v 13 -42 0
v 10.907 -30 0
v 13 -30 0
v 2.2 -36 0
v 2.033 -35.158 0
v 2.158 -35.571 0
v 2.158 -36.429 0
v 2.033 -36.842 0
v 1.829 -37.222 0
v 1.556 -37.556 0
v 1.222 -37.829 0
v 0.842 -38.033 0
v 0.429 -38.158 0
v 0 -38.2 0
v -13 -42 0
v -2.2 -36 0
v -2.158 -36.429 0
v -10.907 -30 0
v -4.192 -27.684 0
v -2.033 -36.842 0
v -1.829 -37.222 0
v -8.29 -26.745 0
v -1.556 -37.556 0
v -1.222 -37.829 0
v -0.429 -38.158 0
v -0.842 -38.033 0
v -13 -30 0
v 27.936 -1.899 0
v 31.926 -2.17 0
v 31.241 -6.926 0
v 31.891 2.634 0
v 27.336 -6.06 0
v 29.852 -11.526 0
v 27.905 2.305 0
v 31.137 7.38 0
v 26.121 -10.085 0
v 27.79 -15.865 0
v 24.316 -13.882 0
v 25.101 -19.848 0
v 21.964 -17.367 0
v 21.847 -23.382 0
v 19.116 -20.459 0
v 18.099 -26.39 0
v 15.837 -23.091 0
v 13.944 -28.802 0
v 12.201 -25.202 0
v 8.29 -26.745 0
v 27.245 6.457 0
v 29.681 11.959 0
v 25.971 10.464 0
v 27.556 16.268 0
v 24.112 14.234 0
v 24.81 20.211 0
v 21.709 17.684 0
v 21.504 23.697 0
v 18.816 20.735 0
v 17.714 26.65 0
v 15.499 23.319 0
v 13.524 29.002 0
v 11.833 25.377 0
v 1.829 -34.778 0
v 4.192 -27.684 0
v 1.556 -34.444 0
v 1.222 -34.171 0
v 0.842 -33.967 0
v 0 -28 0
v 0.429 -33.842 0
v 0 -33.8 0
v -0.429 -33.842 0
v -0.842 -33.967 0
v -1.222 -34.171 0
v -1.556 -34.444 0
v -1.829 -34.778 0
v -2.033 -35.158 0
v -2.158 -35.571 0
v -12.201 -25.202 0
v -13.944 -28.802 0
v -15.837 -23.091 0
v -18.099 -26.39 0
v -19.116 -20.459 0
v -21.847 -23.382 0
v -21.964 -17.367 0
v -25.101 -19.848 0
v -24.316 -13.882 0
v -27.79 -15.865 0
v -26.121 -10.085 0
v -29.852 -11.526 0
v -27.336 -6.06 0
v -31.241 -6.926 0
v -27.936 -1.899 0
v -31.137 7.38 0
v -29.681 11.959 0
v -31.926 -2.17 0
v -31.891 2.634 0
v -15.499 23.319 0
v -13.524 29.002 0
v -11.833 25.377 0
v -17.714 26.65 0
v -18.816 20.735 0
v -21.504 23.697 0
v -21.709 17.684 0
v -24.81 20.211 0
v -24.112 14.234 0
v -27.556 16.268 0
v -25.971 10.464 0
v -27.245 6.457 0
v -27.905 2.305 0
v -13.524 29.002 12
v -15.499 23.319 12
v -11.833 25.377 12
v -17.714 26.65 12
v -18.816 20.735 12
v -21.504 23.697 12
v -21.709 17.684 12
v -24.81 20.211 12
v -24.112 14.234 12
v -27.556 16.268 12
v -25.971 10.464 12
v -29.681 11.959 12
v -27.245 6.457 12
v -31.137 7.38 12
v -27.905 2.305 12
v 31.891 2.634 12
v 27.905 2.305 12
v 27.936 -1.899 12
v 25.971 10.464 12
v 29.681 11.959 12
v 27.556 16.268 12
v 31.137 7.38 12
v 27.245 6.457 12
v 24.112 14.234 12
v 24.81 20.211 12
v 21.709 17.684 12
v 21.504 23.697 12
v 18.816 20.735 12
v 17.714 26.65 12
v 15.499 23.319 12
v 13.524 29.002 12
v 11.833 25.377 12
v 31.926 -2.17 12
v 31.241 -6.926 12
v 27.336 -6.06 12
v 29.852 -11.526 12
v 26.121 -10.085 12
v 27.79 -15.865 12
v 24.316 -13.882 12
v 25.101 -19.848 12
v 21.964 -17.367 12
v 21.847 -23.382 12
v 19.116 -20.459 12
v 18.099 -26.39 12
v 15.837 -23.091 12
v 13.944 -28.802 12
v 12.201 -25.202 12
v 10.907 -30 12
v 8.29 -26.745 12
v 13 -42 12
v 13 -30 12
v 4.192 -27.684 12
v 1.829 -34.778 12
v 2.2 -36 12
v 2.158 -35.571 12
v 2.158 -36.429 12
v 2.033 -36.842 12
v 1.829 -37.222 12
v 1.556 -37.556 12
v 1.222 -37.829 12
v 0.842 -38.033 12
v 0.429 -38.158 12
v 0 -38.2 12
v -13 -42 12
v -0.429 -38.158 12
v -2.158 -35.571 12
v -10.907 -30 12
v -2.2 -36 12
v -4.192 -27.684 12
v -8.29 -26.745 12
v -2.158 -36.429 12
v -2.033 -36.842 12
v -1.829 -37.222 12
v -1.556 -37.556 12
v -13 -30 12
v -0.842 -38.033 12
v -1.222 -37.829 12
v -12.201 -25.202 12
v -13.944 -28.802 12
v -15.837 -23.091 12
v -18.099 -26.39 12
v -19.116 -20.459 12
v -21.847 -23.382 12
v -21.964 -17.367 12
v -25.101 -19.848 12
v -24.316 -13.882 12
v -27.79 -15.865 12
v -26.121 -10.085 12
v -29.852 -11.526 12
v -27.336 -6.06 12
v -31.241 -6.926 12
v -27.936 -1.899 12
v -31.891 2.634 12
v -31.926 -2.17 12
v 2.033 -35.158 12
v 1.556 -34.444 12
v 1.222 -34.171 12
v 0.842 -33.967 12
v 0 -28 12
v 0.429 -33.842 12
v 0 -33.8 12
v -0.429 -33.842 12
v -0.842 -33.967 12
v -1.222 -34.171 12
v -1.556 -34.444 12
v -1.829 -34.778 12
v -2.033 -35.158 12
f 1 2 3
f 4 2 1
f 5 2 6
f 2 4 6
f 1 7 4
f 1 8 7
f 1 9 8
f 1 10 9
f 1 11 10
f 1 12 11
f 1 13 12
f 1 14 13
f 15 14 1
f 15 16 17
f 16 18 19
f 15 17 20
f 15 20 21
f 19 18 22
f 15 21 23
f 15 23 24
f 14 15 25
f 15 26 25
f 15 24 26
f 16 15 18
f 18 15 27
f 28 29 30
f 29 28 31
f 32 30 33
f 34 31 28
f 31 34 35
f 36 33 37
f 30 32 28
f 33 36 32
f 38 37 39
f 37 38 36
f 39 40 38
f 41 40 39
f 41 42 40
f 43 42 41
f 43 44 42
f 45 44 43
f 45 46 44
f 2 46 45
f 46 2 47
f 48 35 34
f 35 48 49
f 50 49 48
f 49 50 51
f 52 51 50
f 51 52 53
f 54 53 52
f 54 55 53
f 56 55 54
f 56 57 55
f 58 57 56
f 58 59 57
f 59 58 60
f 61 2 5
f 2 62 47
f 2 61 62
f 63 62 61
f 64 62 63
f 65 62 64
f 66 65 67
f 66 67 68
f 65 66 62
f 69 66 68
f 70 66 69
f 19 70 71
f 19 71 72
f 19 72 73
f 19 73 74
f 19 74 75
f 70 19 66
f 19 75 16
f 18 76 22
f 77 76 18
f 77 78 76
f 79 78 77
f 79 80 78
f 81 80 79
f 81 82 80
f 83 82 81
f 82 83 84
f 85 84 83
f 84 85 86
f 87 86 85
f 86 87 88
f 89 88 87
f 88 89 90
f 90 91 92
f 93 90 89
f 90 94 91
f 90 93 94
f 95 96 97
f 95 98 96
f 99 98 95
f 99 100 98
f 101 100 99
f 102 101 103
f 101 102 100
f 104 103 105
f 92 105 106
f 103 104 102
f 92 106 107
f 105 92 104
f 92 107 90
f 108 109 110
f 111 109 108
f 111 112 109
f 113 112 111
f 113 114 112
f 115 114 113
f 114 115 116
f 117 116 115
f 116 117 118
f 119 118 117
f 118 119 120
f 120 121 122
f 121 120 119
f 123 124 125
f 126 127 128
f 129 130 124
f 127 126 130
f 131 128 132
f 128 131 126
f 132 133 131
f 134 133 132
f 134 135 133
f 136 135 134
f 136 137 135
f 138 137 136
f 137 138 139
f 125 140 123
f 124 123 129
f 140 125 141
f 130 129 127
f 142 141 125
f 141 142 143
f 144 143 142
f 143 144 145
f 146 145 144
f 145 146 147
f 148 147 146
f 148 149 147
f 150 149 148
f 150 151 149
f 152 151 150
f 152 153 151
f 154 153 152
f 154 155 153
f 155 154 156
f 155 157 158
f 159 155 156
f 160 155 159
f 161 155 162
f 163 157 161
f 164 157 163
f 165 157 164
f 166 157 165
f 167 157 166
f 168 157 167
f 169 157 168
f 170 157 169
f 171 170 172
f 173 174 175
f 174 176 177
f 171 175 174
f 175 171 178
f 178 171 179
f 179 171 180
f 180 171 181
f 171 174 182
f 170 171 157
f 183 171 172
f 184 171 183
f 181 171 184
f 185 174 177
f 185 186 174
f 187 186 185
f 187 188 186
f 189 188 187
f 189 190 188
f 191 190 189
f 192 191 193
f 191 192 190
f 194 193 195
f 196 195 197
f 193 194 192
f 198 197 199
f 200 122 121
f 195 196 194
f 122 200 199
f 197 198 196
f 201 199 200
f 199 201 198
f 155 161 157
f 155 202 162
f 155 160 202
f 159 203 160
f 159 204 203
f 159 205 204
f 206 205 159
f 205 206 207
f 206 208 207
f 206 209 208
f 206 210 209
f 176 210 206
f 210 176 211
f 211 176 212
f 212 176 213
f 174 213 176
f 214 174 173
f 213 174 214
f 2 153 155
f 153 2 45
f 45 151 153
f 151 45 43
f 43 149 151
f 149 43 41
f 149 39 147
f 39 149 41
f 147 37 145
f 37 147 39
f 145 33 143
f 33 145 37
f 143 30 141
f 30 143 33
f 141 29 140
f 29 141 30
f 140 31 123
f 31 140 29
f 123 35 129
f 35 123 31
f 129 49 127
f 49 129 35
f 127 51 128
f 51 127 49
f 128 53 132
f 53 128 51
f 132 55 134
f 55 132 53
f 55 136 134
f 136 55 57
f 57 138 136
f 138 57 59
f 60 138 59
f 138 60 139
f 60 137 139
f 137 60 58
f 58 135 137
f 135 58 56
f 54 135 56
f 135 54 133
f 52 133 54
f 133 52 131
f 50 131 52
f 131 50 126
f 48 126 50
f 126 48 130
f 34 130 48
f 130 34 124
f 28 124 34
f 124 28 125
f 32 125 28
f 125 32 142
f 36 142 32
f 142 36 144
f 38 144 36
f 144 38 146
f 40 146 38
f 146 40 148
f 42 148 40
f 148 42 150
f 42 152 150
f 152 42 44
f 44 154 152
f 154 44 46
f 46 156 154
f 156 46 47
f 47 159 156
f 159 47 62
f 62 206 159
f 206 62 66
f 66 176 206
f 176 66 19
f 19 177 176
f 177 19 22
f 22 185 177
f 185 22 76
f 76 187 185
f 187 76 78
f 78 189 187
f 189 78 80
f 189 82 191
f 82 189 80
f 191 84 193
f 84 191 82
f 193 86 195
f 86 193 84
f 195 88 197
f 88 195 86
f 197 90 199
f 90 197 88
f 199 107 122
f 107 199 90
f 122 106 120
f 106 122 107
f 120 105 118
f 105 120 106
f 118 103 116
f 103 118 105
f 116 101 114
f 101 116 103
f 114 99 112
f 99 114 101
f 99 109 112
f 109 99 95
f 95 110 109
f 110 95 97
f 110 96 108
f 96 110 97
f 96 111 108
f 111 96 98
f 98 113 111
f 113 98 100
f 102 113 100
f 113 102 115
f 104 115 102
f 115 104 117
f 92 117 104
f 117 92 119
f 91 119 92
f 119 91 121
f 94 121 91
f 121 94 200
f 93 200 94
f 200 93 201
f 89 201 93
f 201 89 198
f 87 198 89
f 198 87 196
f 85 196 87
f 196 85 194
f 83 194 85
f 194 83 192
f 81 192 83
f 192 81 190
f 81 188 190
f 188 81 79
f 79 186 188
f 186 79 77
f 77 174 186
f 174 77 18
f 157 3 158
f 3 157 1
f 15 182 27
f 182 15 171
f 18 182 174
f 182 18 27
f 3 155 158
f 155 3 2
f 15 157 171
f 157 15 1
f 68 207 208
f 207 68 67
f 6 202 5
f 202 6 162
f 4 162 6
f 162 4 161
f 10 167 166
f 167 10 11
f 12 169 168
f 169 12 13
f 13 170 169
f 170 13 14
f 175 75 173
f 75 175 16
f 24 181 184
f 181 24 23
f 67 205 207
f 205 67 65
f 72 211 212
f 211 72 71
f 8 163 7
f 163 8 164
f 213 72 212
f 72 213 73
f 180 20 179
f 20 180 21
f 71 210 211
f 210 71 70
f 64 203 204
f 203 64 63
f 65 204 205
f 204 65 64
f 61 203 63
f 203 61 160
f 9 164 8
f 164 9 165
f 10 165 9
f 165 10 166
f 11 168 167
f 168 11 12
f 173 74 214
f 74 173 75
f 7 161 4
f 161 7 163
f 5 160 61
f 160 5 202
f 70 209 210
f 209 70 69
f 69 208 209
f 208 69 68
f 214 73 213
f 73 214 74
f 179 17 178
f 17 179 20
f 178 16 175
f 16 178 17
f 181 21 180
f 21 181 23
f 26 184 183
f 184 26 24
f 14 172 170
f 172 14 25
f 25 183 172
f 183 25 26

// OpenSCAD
$fn = 32;

// ----------------------------------------------------------------------
// Spring clip: 64 mm outside, 4 mm band, 50 degree opening
// ----------------------------------------------------------------------

// --- parameters (mm) ---
outer_r = 32;             // clip outside radius
inner_r = 28;             // clip bore radius
band = 4;                 // band thickness
clip_w = 12;              // clip width
opening = 50;             // opening angle
tab_w = 26;               // tab width
tab_len = 10;             // tab length past the clip
tab_hole = 4.4;           // tab fixing hole

clip_profile = [[-13.524, 29.002], [-17.714, 26.65], [-21.504, 23.697], [-24.81, 20.211], [-27.556, 16.268], [-29.681, 11.959], [-31.137, 7.38], [-31.891, 2.634], [-31.926, -2.17], [-31.241, -6.926], [-29.852, -11.526], [-27.79, -15.865], [-25.101, -19.848], [-21.847, -23.382], [-18.099, -26.39], [-13.944, -28.802], [-9.475, -30.565], [-4.791, -31.639], [0, -32], [4.791, -31.639], [9.475, -30.565], [13.944, -28.802], [18.099, -26.39], [21.847, -23.382], [25.101, -19.848], [27.79, -15.865], [29.852, -11.526], [31.241, -6.926], [31.926, -2.17], [31.891, 2.634], [31.137, 7.38], [29.681, 11.959], [27.556, 16.268], [24.81, 20.211], [21.504, 23.697], [17.714, 26.65], [13.524, 29.002], [11.833, 25.377], [15.499, 23.319], [18.816, 20.735], [21.709, 17.684], [24.112, 14.234], [25.971, 10.464], [27.245, 6.457], [27.905, 2.305], [27.936, -1.899], [27.336, -6.06], [26.121, -10.085], [24.316, -13.882], [21.964, -17.367], [19.116, -20.459], [15.837, -23.091], [12.201, -25.202], [8.29, -26.745], [4.192, -27.684], [0, -28], [-4.192, -27.684], [-8.29, -26.745], [-12.201, -25.202], [-15.837, -23.091], [-19.116, -20.459], [-21.964, -17.367], [-24.316, -13.882], [-26.121, -10.085], [-27.336, -6.06], [-27.936, -1.899], [-27.905, 2.305], [-27.245, 6.457], [-25.971, 10.464], [-24.112, 14.234], [-21.709, 17.684], [-18.816, 20.735], [-15.499, 23.319], [-11.833, 25.377]];

difference() {
  union() {
    linear_extrude(height = clip_w) polygon(clip_profile);
    /* mounting tab, sunk 2 mm into the band */
    translate([-13, -42, 0]) cube([tab_w, 12, clip_w]);
  }
  translate([0, -36, -2.5]) cylinder(h = clip_w + 5, d = tab_hole);
}
